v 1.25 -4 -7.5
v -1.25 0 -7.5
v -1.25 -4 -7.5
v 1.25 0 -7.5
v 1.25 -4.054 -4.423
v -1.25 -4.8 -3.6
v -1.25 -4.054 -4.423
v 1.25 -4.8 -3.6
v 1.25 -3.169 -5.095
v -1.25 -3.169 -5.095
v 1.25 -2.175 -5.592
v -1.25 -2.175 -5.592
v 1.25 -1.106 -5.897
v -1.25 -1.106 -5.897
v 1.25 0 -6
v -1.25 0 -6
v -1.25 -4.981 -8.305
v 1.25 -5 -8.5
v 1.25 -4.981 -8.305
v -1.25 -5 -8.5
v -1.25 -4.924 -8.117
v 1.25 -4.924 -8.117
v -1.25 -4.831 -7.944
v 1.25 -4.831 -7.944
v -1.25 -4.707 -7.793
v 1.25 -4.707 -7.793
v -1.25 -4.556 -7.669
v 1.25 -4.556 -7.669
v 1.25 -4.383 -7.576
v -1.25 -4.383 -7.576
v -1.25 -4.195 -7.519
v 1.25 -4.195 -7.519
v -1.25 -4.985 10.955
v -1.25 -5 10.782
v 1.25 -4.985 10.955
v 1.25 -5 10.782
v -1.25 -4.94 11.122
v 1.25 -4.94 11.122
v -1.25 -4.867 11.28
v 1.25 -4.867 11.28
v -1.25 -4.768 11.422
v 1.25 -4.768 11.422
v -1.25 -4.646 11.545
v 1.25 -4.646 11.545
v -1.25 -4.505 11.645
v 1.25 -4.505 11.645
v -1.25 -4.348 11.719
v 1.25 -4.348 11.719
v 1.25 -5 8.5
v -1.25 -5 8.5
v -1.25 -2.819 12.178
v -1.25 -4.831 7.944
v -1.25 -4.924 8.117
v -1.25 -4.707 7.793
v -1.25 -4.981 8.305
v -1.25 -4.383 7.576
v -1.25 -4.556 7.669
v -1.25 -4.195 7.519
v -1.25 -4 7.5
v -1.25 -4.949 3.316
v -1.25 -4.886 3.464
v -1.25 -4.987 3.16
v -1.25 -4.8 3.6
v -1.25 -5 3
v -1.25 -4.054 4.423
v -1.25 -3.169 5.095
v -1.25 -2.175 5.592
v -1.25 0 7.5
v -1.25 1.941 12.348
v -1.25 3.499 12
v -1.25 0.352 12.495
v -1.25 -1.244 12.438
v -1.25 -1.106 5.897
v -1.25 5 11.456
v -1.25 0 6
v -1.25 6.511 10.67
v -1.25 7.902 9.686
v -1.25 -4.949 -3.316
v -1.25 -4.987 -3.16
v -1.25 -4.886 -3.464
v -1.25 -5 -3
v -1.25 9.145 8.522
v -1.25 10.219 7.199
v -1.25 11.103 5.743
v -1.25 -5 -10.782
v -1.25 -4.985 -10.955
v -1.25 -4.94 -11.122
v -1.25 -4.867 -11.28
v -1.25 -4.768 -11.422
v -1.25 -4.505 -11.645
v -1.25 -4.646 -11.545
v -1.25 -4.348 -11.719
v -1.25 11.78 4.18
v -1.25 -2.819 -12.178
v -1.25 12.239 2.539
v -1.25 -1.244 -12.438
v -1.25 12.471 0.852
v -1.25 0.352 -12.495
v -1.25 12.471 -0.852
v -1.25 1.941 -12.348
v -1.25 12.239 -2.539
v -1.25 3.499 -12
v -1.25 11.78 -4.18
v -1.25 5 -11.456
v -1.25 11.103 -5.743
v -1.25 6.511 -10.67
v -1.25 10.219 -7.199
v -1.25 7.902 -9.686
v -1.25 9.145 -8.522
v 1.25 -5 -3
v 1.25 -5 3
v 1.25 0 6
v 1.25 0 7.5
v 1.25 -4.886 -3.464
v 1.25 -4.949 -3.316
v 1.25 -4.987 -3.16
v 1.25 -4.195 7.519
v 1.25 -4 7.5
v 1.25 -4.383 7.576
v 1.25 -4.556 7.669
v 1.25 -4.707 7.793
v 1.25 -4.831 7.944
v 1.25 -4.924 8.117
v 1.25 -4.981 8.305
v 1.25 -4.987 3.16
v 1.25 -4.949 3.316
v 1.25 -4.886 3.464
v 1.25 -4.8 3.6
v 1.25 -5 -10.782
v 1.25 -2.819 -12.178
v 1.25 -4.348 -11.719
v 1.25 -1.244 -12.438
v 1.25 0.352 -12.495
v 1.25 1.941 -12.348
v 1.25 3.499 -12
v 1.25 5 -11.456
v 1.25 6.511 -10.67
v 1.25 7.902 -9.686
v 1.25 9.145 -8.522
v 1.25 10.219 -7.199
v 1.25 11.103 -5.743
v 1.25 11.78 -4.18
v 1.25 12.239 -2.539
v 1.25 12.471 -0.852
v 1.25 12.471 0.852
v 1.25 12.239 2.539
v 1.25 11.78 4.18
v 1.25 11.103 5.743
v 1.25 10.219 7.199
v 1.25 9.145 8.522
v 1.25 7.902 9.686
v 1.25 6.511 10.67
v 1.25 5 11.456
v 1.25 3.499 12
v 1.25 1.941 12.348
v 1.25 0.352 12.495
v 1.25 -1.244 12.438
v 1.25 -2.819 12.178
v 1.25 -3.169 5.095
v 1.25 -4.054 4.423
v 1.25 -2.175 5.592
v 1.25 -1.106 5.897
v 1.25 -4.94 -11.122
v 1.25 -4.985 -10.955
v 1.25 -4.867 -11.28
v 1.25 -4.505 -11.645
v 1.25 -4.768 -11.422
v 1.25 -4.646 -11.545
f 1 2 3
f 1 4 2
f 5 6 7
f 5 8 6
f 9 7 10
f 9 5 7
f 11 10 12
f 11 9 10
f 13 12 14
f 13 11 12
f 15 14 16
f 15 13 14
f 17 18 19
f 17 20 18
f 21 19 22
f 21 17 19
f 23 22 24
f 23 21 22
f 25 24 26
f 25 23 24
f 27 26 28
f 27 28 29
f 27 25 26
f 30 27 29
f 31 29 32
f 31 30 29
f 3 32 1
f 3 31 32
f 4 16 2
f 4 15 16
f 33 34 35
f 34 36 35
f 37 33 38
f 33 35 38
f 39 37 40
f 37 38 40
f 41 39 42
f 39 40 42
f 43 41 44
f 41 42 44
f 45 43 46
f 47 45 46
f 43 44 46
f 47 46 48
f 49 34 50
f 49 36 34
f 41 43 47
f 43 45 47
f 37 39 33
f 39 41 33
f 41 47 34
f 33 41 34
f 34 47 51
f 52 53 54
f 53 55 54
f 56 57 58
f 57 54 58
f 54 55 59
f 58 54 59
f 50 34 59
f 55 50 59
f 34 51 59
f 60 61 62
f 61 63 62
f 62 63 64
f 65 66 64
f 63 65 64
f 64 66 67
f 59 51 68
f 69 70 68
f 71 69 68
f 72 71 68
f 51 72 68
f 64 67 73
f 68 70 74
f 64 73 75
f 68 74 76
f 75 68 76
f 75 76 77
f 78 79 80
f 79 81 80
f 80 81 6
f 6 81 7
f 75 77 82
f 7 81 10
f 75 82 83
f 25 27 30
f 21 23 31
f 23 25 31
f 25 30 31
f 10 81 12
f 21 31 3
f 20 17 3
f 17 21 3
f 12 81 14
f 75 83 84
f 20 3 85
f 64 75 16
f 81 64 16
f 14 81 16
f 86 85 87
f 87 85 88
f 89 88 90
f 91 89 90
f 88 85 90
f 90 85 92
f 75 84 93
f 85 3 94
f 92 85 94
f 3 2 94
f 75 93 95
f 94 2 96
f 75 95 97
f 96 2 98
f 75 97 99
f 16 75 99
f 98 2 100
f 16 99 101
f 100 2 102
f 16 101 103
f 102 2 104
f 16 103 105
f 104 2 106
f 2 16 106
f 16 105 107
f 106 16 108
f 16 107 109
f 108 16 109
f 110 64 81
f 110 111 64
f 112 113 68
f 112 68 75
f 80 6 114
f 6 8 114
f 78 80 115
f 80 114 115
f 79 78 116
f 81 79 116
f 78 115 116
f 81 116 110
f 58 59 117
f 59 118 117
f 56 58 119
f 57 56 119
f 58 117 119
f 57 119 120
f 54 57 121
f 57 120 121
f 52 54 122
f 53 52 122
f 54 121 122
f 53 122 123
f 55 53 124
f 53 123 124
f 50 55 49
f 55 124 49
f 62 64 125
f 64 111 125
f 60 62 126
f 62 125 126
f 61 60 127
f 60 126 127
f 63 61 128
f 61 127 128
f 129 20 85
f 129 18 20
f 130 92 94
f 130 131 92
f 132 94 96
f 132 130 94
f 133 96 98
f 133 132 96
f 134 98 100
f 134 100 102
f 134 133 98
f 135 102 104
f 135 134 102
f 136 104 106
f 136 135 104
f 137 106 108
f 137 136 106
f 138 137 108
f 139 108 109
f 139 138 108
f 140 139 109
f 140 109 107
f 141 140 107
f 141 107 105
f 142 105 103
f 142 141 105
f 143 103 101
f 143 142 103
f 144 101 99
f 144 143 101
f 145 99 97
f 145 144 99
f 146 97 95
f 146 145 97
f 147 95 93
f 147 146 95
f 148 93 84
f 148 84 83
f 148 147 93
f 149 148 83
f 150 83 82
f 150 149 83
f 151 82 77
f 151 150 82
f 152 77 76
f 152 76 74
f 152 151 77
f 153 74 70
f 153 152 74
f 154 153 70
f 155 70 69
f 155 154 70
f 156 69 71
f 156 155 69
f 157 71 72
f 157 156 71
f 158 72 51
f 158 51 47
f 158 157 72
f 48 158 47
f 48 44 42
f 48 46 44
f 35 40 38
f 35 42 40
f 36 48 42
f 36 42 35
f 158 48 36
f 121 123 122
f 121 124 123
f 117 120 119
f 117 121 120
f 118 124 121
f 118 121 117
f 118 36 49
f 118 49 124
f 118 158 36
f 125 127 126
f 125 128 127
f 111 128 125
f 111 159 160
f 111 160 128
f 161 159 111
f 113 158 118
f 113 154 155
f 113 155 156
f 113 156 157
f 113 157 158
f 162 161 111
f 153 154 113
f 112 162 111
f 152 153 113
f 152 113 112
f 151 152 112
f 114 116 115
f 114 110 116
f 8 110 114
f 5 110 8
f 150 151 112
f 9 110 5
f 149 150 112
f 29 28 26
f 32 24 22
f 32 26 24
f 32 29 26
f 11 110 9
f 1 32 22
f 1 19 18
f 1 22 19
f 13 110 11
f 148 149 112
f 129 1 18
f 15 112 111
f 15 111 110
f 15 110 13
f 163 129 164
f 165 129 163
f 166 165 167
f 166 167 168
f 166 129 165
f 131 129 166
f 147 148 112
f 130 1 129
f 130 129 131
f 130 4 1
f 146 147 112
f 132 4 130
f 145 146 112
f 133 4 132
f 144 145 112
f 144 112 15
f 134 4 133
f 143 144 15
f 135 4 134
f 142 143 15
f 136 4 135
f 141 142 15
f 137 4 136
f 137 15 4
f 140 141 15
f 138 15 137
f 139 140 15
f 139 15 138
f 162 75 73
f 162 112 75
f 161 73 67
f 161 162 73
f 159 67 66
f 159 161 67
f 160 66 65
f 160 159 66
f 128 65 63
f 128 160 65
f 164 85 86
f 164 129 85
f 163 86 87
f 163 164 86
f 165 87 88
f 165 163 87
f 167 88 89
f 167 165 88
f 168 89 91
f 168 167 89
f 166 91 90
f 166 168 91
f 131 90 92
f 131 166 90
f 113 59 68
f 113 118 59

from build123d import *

# Parameters (mm, degrees)
BOSS_EXTRUDE1_DEPTH = 1.25
FILLET1_R           = 1


with BuildPart() as part:
    # Sketch1 → Boss-Extrude1 (new, symmetric)
    with BuildSketch(Plane(origin=(0, 0, 0), x_dir=(0, 0, -1), z_dir=(1, 0, 0))):
        with BuildLine():
            Line((7.5, -5), (11.456439237, -5))
            ThreePointArc((11.456439237, -5), (12.5, 0), (11.456439237, 5))
            Line((11.456439237, 5), (-11.456439237, 5))
            ThreePointArc((-11.456439237, 5), (-12.5, 0), (-11.456439237, -5))
            Line((-11.456439237, -5), (-7.5, -5))
            Line((-7.5, -5), (-7.5, 0))
            Line((-7.5, 0), (-6, 0))
            ThreePointArc((-6, 0), (-5.286764074, -2.837274331), (-3.31662479, -5))
            Line((-3.31662479, -5), (-4.153311931, -5))
            Line((-4.153311931, -5), (3.31662479, -5))
            ThreePointArc((3.31662479, -5), (5.286764074, -2.837274331), (6, 0))
            Line((6, 0), (7.5, 0))
            Line((7.5, 0), (7.5, -5))
        make_face()
        with BuildLine():
            ThreePointArc((11.456439237, 5), (0, 12.5), (-11.456439237, 5))
            Line((-11.456439237, 5), (11.456439237, 5))
        make_face()
    extrude(amount=BOSS_EXTRUDE1_DEPTH, both=True)

    # Fillet1
    fillet1_edges = [part.edges().sort_by_distance(p)[0] for p in [
        (0, -5, -3.31662479),
        (0, -5, 3.31662479),
        (0, -5, 7.5),
        (0, -5, 11.456439237),
        (0, -5, -11.456439237),
        (0, -5, -7.5),
    ]]
    fillet(fillet1_edges, radius=FILLET1_R)


solid = part.part
